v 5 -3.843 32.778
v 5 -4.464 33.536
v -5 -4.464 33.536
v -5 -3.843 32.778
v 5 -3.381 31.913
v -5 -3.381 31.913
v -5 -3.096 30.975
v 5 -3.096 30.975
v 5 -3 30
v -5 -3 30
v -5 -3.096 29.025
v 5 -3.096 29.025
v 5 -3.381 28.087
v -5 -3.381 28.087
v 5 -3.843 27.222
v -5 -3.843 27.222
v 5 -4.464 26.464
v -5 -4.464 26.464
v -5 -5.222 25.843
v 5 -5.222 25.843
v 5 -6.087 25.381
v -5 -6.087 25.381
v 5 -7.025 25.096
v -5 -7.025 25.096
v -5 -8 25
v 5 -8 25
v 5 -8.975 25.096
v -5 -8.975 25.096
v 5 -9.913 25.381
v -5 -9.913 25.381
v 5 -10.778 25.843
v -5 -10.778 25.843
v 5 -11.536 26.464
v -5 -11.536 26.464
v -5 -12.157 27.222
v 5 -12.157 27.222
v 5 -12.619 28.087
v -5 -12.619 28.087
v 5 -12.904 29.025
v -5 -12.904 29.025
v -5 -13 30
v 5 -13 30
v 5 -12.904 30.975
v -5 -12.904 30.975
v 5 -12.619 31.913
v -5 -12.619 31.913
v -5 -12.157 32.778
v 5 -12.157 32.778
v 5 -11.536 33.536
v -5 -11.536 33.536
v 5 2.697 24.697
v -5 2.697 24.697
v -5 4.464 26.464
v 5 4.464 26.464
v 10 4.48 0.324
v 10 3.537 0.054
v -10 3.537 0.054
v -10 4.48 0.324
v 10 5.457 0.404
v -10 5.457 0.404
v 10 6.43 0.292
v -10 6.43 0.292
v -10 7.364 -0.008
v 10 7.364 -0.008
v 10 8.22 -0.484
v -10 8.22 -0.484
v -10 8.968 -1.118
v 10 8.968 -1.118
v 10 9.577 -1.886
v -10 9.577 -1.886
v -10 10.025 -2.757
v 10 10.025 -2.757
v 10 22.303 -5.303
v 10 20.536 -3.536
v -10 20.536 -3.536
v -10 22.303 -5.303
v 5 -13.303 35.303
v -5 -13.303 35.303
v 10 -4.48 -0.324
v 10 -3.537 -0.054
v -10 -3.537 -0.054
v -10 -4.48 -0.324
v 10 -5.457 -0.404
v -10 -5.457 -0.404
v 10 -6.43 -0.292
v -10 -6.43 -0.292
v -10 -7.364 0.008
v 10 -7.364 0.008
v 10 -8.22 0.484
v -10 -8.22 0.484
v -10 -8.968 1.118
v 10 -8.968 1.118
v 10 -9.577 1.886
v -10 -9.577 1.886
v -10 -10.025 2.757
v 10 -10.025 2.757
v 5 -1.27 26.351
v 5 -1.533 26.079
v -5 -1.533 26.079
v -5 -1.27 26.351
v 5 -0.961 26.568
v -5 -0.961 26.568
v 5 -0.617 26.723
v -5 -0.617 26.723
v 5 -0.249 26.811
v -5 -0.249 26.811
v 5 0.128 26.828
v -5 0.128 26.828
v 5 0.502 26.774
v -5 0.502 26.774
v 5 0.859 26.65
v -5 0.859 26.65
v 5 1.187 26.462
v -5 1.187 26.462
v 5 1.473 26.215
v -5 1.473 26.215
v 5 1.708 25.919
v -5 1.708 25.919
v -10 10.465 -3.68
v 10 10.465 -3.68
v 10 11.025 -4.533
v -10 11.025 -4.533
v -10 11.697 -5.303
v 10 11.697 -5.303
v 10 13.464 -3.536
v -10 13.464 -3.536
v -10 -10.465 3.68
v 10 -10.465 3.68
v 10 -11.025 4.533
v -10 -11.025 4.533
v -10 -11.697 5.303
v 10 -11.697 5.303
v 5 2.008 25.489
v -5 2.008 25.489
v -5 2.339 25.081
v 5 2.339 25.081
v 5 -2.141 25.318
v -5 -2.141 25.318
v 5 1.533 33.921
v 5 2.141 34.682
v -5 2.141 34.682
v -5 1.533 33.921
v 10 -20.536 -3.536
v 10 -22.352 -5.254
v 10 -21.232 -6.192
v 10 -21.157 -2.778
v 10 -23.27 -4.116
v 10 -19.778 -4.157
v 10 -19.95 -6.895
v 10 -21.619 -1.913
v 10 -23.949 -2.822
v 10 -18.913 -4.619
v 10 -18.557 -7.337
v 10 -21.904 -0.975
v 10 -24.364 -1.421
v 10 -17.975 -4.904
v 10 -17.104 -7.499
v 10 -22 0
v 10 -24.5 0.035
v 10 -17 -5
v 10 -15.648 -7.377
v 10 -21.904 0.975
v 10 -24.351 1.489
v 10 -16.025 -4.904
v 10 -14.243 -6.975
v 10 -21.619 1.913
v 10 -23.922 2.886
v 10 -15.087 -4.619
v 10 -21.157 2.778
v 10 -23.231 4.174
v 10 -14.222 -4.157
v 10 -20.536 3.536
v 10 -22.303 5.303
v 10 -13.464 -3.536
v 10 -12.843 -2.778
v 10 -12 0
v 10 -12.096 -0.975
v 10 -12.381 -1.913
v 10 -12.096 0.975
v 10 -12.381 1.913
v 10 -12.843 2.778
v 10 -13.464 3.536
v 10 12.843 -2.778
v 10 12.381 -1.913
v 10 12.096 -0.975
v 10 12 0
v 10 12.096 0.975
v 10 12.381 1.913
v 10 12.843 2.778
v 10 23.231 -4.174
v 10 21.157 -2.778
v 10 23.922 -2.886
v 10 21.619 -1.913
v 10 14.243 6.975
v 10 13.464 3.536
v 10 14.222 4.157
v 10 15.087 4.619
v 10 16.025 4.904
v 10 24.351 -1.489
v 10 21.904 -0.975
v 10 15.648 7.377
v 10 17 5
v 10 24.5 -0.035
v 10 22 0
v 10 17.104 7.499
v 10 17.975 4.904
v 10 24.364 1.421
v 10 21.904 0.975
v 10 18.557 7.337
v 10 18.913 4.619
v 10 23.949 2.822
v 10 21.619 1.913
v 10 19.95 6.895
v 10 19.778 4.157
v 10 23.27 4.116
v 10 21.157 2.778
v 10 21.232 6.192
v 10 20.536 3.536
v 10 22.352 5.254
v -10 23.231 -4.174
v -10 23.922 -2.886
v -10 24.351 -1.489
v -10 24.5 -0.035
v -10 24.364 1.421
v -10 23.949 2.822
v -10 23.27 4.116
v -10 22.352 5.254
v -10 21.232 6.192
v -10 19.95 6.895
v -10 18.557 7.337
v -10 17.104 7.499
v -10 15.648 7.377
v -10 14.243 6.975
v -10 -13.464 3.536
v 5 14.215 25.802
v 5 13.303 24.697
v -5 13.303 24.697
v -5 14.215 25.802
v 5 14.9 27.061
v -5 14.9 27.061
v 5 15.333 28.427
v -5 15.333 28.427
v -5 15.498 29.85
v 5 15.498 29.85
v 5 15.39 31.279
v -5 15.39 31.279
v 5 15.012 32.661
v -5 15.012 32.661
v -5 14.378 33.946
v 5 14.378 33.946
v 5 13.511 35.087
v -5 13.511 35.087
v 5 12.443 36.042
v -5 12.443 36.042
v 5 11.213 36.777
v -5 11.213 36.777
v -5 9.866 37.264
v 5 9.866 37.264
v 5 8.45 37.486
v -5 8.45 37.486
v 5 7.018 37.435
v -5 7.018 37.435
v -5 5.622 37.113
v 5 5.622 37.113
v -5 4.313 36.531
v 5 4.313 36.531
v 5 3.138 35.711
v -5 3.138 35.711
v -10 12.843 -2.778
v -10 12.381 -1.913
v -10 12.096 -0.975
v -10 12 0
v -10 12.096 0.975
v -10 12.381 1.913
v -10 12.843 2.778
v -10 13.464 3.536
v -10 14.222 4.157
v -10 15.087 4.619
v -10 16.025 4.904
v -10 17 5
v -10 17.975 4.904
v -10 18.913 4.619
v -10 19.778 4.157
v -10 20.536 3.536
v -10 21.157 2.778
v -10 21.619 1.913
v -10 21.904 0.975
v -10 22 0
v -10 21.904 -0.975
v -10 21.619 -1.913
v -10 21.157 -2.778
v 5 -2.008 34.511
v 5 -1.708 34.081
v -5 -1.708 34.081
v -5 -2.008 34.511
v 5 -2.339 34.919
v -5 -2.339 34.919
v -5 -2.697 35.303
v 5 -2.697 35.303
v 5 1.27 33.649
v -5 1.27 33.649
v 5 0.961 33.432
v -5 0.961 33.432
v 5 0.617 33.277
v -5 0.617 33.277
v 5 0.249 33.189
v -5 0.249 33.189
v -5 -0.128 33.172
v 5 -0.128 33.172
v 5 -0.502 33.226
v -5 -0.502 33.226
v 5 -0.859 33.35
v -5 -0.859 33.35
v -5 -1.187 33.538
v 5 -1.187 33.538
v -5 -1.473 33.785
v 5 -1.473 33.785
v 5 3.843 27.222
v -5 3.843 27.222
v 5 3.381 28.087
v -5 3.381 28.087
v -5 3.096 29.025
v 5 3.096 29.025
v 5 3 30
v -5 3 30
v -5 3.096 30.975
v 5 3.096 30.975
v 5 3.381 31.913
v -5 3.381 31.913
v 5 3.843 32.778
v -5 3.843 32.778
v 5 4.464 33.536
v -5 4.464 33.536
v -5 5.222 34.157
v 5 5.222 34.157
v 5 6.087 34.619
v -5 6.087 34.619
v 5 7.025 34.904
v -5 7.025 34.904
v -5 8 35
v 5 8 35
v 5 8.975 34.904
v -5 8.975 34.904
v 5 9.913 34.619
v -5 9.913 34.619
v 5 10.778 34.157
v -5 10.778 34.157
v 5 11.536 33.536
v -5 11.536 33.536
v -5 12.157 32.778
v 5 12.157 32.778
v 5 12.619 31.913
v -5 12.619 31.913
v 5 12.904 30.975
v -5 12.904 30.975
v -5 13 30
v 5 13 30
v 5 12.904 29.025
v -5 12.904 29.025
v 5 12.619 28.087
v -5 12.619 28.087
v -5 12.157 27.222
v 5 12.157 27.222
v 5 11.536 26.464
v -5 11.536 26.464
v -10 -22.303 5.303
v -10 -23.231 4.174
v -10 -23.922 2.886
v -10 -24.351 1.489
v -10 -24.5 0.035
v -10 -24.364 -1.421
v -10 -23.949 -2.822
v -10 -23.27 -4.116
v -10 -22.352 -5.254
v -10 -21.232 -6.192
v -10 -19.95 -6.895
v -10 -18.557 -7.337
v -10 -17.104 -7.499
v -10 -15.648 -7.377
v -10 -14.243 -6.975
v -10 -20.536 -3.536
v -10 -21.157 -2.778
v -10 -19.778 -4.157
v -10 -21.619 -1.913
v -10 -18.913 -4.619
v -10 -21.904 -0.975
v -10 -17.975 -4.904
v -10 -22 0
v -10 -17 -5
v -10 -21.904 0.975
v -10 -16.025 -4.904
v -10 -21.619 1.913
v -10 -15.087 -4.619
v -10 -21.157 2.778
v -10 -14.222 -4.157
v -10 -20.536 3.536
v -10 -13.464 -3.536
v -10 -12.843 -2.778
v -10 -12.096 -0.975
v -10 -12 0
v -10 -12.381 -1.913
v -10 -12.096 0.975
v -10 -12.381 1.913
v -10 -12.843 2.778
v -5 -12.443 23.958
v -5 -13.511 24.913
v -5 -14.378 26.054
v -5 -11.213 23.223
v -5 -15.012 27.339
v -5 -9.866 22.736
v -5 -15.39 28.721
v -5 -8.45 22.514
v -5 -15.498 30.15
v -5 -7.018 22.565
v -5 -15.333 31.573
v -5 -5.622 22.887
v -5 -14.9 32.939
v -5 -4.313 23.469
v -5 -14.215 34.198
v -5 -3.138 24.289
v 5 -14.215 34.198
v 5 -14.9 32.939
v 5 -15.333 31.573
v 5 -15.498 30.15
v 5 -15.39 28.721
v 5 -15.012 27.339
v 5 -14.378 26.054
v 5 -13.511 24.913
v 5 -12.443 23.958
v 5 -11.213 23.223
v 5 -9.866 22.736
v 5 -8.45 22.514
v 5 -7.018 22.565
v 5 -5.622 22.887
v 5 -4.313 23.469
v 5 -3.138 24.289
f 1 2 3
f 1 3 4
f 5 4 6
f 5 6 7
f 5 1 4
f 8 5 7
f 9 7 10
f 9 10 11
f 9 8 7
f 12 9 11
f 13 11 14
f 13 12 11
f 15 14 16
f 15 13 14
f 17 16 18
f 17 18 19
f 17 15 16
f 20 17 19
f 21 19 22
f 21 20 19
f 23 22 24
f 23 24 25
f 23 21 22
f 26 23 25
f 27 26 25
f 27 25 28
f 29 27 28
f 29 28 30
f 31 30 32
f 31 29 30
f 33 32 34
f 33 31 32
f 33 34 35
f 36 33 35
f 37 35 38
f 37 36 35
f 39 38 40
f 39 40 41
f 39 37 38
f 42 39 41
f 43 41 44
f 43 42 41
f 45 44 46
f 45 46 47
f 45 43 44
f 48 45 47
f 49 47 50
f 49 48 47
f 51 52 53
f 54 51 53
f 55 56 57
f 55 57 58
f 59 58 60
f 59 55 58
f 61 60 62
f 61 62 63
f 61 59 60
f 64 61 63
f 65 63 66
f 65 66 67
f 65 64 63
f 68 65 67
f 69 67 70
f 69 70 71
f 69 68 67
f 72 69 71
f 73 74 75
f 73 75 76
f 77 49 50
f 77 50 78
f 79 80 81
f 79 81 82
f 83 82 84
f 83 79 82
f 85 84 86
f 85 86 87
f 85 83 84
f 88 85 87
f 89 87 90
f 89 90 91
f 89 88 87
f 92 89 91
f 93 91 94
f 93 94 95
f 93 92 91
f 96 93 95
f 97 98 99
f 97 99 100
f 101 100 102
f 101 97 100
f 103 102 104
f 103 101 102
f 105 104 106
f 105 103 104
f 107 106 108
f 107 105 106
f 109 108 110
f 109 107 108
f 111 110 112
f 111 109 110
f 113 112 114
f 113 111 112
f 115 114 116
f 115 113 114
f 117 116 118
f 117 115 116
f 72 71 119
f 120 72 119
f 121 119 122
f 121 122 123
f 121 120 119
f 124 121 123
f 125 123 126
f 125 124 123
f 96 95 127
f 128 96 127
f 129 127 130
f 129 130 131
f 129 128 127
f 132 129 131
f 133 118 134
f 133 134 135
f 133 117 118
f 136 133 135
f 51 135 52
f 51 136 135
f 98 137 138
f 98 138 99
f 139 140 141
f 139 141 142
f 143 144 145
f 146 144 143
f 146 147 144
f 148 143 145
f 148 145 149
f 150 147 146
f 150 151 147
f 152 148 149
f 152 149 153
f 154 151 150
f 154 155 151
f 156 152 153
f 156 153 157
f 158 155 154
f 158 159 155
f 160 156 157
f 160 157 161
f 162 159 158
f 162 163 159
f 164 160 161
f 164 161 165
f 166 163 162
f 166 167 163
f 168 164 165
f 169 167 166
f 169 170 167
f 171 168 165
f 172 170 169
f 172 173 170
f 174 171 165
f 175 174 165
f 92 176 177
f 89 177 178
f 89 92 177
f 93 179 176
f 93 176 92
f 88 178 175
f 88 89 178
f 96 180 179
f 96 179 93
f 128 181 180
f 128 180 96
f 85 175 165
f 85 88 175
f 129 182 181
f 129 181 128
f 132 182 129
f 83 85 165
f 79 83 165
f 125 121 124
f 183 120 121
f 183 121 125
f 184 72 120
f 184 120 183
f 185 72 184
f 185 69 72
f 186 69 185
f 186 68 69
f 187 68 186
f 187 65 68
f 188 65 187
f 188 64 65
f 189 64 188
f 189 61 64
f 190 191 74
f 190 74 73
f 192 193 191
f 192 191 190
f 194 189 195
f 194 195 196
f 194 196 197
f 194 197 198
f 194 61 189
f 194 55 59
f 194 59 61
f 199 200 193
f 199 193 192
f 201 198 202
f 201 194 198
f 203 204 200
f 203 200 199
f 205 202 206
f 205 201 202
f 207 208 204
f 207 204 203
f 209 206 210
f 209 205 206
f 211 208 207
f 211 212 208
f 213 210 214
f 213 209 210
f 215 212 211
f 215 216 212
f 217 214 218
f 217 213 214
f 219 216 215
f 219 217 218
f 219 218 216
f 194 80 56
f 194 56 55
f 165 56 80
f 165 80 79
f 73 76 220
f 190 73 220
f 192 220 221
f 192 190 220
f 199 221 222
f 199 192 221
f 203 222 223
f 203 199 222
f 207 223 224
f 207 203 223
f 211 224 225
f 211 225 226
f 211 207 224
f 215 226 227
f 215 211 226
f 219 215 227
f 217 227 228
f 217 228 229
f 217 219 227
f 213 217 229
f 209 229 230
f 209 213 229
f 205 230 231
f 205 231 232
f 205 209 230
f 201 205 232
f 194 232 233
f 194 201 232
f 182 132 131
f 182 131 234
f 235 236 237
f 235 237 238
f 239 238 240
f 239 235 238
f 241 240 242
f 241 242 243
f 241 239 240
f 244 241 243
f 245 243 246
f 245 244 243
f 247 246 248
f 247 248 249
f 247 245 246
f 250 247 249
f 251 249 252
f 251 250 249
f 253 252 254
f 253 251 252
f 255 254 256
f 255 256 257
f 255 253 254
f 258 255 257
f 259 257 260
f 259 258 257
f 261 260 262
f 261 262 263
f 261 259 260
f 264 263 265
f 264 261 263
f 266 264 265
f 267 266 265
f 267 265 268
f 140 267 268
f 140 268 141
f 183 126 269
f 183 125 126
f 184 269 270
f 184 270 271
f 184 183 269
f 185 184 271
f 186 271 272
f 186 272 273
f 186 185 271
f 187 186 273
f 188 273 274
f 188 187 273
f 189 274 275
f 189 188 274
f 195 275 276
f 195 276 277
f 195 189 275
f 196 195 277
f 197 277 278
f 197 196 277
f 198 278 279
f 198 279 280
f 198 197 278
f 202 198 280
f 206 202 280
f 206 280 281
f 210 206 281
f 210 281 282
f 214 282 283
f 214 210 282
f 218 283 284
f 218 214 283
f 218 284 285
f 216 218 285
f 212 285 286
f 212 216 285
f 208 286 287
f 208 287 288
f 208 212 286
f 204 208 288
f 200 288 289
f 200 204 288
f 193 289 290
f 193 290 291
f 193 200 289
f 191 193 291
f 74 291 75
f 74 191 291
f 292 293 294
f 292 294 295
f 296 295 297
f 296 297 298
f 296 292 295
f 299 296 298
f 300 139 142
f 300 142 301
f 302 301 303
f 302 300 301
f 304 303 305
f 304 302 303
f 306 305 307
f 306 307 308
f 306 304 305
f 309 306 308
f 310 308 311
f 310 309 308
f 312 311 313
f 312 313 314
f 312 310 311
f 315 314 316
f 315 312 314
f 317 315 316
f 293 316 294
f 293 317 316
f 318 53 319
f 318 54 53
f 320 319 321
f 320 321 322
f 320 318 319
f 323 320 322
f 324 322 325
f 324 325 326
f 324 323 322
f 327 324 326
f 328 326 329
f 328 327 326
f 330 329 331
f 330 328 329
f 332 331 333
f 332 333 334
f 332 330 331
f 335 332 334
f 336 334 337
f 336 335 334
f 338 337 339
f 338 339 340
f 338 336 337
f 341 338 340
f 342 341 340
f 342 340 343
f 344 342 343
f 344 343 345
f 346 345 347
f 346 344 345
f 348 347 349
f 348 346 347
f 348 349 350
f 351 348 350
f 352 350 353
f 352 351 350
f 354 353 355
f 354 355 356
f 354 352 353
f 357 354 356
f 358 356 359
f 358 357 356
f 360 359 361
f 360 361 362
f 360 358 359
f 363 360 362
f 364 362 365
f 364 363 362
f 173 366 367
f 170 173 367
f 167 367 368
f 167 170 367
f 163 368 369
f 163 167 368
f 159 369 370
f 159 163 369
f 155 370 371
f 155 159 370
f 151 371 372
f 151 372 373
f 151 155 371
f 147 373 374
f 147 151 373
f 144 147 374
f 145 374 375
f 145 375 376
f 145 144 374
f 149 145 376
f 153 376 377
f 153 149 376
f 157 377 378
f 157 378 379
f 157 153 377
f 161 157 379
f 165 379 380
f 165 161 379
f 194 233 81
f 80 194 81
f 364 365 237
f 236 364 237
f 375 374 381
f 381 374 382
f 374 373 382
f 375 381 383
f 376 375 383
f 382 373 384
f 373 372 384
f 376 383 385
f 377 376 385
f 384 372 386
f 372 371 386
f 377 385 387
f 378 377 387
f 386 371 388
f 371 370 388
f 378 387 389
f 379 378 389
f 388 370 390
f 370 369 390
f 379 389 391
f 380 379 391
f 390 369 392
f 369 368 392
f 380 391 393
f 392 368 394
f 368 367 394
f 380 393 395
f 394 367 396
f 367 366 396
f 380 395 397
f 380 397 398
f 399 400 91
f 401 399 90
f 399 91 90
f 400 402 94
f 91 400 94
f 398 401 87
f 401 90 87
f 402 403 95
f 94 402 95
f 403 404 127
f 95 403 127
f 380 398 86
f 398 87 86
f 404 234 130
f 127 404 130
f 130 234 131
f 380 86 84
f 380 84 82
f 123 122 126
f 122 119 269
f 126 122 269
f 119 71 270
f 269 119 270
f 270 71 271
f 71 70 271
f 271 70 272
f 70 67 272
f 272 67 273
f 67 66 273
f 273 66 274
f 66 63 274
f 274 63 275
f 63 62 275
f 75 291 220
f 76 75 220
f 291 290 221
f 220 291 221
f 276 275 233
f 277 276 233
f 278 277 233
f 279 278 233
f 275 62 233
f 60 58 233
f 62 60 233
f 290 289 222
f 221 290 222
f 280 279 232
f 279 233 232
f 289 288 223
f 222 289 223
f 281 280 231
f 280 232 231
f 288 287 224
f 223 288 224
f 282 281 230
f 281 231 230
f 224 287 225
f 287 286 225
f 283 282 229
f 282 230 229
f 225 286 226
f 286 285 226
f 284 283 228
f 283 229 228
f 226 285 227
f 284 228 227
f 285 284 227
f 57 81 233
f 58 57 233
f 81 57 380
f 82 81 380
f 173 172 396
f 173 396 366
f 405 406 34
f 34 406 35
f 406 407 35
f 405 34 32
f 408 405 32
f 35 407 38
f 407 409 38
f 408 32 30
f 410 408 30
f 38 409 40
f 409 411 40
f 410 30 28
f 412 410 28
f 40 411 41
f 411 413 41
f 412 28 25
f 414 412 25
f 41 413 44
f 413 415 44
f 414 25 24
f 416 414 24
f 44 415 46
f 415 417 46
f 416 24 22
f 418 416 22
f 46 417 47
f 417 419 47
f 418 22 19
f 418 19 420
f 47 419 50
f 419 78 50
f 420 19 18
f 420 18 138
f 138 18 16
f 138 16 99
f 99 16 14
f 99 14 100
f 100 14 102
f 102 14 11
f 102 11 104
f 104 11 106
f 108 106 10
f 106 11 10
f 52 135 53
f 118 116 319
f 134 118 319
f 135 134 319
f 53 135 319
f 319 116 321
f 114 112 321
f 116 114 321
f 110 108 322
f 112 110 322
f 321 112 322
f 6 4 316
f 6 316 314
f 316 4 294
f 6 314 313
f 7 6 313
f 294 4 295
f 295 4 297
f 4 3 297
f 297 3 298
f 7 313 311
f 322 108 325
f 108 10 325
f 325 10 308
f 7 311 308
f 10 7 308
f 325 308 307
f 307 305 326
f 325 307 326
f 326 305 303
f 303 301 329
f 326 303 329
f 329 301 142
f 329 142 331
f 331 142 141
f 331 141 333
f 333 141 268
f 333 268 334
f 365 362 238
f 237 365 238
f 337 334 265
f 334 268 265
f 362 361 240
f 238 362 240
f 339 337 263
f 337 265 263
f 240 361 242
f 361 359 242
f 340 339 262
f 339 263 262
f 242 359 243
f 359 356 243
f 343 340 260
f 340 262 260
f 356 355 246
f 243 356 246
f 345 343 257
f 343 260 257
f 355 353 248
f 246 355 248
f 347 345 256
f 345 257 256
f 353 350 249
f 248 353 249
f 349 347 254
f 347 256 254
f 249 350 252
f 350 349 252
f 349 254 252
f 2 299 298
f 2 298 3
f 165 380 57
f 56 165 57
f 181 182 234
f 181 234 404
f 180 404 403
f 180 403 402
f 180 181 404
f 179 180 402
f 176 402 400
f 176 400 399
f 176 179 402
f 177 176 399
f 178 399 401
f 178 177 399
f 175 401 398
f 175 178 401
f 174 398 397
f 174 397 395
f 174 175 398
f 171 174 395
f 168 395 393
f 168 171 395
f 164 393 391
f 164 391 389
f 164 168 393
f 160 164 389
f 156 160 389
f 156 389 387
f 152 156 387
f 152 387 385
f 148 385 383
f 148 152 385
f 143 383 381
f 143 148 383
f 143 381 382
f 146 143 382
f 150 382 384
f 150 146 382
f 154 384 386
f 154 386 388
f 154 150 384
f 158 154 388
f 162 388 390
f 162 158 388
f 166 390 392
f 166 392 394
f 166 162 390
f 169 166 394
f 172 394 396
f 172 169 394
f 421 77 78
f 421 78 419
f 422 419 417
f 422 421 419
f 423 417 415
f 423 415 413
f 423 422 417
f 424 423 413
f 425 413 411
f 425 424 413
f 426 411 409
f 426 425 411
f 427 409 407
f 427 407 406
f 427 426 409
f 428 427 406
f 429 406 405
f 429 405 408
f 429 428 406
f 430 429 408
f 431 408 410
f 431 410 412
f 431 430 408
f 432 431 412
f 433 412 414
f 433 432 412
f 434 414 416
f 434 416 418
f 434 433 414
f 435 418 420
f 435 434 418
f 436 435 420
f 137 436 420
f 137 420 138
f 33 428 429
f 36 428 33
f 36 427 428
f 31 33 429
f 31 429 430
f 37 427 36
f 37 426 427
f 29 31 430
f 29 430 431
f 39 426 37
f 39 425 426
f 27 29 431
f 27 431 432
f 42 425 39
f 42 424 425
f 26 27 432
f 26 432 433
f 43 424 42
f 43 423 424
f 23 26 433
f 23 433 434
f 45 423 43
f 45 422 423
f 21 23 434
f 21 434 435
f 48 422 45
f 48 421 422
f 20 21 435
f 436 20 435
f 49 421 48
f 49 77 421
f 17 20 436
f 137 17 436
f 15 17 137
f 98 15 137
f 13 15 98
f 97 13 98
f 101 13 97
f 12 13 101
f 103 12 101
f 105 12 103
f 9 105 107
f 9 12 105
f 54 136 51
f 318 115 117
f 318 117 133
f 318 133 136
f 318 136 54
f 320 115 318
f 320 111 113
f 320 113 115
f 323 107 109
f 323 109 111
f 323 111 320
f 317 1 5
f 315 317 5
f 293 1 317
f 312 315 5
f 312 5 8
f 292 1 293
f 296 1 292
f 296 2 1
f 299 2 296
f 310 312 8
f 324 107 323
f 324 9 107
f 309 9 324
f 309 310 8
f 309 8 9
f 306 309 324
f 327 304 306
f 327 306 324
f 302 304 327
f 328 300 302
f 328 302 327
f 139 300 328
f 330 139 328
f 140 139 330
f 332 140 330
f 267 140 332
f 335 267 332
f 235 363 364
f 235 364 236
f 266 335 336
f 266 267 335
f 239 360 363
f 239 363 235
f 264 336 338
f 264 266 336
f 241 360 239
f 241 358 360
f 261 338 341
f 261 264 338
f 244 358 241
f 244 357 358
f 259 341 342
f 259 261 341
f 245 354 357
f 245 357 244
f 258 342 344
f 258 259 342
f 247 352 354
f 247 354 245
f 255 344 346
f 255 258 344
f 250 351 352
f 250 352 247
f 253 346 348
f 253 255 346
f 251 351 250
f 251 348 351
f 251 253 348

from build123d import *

# Parameters (mm, degrees)
F1_DEPTH = 5
F2_DEPTH = 10


with BuildPart() as f1:
    # F0 (on Right) → F1 (new body, symmetric)
    with BuildSketch(Plane.YZ):
        with BuildLine():
            ThreePointArc((4.464466, 26.464466), (8, 35), (11.535534, 26.464466))
            Line((11.535534, 26.464466), (13.303301, 24.696699))
            ThreePointArc((13.303301, 24.696699), (13.000205, 35.589987), (2.140625, 34.681637))
            Line((2.140625, 34.681637), (1.532877, 33.921001))
            ThreePointArc((1.532877, 33.921001), (-0.128336, 33.171875), (-1.707597, 34.081135))
            ThreePointArc((-1.707597, 34.081135), (-2.170033, 34.718208), (-2.696699, 35.303301))
            Line((-2.696699, 35.303301), (-4.464466, 33.535534))
            ThreePointArc((-4.464466, 33.535534), (-8, 25), (-11.535534, 33.535534))
            Line((-11.535534, 33.535534), (-13.303301, 35.303301))
            ThreePointArc((-13.303301, 35.303301), (-13.000205, 24.410013), (-2.140625, 25.318363))
            Line((-2.140625, 25.318363), (-1.532877, 26.078999))
            ThreePointArc((-1.532877, 26.078999), (0.128336, 26.828125), (1.707597, 25.918865))
            ThreePointArc((1.707597, 25.918865), (2.170033, 25.281792), (2.696699, 24.696699))
            Line((2.696699, 24.696699), (4.464466, 26.464466))
        make_face()
    extrude(amount=F1_DEPTH, both=True)


with BuildPart() as f2:
    # F0 (on Right) → F2 (new body, symmetric)
    with BuildSketch(Plane.YZ):
        with BuildLine():
            ThreePointArc((13.464466, -3.535534), (17, 5), (20.535534, -3.535534))
            Line((20.535534, -3.535534), (22.303301, -5.303301))
            ThreePointArc((22.303301, -5.303301), (23.269612, 4.116062), (14.242647, 6.97474))
            Line((14.242647, 6.97474), (-3.537197, -0.054239))
            ThreePointArc((-3.537197, -0.054239), (-7.363528, 0.007835), (-10.02526, 2.757353))
            ThreePointArc((-10.02526, 2.757353), (-10.730388, 4.116062), (-11.696699, 5.303301))
            Line((-11.696699, 5.303301), (-13.464466, 3.535534))
            ThreePointArc((-13.464466, 3.535534), (-17, -5), (-20.535534, 3.535534))
            Line((-20.535534, 3.535534), (-22.303301, 5.303301))
            ThreePointArc((-22.303301, 5.303301), (-23.269612, -4.116062), (-14.242647, -6.97474))
            Line((-14.242647, -6.97474), (3.537197, 0.054239))
            ThreePointArc((3.537197, 0.054239), (7.363528, -0.007835), (10.02526, -2.757353))
            ThreePointArc((10.02526, -2.757353), (10.730388, -4.116062), (11.696699, -5.303301))
            Line((11.696699, -5.303301), (13.464466, -3.535534))
        make_face()
    extrude(amount=F2_DEPTH, both=True)


solid = Compound([f1.part, f2.part])
